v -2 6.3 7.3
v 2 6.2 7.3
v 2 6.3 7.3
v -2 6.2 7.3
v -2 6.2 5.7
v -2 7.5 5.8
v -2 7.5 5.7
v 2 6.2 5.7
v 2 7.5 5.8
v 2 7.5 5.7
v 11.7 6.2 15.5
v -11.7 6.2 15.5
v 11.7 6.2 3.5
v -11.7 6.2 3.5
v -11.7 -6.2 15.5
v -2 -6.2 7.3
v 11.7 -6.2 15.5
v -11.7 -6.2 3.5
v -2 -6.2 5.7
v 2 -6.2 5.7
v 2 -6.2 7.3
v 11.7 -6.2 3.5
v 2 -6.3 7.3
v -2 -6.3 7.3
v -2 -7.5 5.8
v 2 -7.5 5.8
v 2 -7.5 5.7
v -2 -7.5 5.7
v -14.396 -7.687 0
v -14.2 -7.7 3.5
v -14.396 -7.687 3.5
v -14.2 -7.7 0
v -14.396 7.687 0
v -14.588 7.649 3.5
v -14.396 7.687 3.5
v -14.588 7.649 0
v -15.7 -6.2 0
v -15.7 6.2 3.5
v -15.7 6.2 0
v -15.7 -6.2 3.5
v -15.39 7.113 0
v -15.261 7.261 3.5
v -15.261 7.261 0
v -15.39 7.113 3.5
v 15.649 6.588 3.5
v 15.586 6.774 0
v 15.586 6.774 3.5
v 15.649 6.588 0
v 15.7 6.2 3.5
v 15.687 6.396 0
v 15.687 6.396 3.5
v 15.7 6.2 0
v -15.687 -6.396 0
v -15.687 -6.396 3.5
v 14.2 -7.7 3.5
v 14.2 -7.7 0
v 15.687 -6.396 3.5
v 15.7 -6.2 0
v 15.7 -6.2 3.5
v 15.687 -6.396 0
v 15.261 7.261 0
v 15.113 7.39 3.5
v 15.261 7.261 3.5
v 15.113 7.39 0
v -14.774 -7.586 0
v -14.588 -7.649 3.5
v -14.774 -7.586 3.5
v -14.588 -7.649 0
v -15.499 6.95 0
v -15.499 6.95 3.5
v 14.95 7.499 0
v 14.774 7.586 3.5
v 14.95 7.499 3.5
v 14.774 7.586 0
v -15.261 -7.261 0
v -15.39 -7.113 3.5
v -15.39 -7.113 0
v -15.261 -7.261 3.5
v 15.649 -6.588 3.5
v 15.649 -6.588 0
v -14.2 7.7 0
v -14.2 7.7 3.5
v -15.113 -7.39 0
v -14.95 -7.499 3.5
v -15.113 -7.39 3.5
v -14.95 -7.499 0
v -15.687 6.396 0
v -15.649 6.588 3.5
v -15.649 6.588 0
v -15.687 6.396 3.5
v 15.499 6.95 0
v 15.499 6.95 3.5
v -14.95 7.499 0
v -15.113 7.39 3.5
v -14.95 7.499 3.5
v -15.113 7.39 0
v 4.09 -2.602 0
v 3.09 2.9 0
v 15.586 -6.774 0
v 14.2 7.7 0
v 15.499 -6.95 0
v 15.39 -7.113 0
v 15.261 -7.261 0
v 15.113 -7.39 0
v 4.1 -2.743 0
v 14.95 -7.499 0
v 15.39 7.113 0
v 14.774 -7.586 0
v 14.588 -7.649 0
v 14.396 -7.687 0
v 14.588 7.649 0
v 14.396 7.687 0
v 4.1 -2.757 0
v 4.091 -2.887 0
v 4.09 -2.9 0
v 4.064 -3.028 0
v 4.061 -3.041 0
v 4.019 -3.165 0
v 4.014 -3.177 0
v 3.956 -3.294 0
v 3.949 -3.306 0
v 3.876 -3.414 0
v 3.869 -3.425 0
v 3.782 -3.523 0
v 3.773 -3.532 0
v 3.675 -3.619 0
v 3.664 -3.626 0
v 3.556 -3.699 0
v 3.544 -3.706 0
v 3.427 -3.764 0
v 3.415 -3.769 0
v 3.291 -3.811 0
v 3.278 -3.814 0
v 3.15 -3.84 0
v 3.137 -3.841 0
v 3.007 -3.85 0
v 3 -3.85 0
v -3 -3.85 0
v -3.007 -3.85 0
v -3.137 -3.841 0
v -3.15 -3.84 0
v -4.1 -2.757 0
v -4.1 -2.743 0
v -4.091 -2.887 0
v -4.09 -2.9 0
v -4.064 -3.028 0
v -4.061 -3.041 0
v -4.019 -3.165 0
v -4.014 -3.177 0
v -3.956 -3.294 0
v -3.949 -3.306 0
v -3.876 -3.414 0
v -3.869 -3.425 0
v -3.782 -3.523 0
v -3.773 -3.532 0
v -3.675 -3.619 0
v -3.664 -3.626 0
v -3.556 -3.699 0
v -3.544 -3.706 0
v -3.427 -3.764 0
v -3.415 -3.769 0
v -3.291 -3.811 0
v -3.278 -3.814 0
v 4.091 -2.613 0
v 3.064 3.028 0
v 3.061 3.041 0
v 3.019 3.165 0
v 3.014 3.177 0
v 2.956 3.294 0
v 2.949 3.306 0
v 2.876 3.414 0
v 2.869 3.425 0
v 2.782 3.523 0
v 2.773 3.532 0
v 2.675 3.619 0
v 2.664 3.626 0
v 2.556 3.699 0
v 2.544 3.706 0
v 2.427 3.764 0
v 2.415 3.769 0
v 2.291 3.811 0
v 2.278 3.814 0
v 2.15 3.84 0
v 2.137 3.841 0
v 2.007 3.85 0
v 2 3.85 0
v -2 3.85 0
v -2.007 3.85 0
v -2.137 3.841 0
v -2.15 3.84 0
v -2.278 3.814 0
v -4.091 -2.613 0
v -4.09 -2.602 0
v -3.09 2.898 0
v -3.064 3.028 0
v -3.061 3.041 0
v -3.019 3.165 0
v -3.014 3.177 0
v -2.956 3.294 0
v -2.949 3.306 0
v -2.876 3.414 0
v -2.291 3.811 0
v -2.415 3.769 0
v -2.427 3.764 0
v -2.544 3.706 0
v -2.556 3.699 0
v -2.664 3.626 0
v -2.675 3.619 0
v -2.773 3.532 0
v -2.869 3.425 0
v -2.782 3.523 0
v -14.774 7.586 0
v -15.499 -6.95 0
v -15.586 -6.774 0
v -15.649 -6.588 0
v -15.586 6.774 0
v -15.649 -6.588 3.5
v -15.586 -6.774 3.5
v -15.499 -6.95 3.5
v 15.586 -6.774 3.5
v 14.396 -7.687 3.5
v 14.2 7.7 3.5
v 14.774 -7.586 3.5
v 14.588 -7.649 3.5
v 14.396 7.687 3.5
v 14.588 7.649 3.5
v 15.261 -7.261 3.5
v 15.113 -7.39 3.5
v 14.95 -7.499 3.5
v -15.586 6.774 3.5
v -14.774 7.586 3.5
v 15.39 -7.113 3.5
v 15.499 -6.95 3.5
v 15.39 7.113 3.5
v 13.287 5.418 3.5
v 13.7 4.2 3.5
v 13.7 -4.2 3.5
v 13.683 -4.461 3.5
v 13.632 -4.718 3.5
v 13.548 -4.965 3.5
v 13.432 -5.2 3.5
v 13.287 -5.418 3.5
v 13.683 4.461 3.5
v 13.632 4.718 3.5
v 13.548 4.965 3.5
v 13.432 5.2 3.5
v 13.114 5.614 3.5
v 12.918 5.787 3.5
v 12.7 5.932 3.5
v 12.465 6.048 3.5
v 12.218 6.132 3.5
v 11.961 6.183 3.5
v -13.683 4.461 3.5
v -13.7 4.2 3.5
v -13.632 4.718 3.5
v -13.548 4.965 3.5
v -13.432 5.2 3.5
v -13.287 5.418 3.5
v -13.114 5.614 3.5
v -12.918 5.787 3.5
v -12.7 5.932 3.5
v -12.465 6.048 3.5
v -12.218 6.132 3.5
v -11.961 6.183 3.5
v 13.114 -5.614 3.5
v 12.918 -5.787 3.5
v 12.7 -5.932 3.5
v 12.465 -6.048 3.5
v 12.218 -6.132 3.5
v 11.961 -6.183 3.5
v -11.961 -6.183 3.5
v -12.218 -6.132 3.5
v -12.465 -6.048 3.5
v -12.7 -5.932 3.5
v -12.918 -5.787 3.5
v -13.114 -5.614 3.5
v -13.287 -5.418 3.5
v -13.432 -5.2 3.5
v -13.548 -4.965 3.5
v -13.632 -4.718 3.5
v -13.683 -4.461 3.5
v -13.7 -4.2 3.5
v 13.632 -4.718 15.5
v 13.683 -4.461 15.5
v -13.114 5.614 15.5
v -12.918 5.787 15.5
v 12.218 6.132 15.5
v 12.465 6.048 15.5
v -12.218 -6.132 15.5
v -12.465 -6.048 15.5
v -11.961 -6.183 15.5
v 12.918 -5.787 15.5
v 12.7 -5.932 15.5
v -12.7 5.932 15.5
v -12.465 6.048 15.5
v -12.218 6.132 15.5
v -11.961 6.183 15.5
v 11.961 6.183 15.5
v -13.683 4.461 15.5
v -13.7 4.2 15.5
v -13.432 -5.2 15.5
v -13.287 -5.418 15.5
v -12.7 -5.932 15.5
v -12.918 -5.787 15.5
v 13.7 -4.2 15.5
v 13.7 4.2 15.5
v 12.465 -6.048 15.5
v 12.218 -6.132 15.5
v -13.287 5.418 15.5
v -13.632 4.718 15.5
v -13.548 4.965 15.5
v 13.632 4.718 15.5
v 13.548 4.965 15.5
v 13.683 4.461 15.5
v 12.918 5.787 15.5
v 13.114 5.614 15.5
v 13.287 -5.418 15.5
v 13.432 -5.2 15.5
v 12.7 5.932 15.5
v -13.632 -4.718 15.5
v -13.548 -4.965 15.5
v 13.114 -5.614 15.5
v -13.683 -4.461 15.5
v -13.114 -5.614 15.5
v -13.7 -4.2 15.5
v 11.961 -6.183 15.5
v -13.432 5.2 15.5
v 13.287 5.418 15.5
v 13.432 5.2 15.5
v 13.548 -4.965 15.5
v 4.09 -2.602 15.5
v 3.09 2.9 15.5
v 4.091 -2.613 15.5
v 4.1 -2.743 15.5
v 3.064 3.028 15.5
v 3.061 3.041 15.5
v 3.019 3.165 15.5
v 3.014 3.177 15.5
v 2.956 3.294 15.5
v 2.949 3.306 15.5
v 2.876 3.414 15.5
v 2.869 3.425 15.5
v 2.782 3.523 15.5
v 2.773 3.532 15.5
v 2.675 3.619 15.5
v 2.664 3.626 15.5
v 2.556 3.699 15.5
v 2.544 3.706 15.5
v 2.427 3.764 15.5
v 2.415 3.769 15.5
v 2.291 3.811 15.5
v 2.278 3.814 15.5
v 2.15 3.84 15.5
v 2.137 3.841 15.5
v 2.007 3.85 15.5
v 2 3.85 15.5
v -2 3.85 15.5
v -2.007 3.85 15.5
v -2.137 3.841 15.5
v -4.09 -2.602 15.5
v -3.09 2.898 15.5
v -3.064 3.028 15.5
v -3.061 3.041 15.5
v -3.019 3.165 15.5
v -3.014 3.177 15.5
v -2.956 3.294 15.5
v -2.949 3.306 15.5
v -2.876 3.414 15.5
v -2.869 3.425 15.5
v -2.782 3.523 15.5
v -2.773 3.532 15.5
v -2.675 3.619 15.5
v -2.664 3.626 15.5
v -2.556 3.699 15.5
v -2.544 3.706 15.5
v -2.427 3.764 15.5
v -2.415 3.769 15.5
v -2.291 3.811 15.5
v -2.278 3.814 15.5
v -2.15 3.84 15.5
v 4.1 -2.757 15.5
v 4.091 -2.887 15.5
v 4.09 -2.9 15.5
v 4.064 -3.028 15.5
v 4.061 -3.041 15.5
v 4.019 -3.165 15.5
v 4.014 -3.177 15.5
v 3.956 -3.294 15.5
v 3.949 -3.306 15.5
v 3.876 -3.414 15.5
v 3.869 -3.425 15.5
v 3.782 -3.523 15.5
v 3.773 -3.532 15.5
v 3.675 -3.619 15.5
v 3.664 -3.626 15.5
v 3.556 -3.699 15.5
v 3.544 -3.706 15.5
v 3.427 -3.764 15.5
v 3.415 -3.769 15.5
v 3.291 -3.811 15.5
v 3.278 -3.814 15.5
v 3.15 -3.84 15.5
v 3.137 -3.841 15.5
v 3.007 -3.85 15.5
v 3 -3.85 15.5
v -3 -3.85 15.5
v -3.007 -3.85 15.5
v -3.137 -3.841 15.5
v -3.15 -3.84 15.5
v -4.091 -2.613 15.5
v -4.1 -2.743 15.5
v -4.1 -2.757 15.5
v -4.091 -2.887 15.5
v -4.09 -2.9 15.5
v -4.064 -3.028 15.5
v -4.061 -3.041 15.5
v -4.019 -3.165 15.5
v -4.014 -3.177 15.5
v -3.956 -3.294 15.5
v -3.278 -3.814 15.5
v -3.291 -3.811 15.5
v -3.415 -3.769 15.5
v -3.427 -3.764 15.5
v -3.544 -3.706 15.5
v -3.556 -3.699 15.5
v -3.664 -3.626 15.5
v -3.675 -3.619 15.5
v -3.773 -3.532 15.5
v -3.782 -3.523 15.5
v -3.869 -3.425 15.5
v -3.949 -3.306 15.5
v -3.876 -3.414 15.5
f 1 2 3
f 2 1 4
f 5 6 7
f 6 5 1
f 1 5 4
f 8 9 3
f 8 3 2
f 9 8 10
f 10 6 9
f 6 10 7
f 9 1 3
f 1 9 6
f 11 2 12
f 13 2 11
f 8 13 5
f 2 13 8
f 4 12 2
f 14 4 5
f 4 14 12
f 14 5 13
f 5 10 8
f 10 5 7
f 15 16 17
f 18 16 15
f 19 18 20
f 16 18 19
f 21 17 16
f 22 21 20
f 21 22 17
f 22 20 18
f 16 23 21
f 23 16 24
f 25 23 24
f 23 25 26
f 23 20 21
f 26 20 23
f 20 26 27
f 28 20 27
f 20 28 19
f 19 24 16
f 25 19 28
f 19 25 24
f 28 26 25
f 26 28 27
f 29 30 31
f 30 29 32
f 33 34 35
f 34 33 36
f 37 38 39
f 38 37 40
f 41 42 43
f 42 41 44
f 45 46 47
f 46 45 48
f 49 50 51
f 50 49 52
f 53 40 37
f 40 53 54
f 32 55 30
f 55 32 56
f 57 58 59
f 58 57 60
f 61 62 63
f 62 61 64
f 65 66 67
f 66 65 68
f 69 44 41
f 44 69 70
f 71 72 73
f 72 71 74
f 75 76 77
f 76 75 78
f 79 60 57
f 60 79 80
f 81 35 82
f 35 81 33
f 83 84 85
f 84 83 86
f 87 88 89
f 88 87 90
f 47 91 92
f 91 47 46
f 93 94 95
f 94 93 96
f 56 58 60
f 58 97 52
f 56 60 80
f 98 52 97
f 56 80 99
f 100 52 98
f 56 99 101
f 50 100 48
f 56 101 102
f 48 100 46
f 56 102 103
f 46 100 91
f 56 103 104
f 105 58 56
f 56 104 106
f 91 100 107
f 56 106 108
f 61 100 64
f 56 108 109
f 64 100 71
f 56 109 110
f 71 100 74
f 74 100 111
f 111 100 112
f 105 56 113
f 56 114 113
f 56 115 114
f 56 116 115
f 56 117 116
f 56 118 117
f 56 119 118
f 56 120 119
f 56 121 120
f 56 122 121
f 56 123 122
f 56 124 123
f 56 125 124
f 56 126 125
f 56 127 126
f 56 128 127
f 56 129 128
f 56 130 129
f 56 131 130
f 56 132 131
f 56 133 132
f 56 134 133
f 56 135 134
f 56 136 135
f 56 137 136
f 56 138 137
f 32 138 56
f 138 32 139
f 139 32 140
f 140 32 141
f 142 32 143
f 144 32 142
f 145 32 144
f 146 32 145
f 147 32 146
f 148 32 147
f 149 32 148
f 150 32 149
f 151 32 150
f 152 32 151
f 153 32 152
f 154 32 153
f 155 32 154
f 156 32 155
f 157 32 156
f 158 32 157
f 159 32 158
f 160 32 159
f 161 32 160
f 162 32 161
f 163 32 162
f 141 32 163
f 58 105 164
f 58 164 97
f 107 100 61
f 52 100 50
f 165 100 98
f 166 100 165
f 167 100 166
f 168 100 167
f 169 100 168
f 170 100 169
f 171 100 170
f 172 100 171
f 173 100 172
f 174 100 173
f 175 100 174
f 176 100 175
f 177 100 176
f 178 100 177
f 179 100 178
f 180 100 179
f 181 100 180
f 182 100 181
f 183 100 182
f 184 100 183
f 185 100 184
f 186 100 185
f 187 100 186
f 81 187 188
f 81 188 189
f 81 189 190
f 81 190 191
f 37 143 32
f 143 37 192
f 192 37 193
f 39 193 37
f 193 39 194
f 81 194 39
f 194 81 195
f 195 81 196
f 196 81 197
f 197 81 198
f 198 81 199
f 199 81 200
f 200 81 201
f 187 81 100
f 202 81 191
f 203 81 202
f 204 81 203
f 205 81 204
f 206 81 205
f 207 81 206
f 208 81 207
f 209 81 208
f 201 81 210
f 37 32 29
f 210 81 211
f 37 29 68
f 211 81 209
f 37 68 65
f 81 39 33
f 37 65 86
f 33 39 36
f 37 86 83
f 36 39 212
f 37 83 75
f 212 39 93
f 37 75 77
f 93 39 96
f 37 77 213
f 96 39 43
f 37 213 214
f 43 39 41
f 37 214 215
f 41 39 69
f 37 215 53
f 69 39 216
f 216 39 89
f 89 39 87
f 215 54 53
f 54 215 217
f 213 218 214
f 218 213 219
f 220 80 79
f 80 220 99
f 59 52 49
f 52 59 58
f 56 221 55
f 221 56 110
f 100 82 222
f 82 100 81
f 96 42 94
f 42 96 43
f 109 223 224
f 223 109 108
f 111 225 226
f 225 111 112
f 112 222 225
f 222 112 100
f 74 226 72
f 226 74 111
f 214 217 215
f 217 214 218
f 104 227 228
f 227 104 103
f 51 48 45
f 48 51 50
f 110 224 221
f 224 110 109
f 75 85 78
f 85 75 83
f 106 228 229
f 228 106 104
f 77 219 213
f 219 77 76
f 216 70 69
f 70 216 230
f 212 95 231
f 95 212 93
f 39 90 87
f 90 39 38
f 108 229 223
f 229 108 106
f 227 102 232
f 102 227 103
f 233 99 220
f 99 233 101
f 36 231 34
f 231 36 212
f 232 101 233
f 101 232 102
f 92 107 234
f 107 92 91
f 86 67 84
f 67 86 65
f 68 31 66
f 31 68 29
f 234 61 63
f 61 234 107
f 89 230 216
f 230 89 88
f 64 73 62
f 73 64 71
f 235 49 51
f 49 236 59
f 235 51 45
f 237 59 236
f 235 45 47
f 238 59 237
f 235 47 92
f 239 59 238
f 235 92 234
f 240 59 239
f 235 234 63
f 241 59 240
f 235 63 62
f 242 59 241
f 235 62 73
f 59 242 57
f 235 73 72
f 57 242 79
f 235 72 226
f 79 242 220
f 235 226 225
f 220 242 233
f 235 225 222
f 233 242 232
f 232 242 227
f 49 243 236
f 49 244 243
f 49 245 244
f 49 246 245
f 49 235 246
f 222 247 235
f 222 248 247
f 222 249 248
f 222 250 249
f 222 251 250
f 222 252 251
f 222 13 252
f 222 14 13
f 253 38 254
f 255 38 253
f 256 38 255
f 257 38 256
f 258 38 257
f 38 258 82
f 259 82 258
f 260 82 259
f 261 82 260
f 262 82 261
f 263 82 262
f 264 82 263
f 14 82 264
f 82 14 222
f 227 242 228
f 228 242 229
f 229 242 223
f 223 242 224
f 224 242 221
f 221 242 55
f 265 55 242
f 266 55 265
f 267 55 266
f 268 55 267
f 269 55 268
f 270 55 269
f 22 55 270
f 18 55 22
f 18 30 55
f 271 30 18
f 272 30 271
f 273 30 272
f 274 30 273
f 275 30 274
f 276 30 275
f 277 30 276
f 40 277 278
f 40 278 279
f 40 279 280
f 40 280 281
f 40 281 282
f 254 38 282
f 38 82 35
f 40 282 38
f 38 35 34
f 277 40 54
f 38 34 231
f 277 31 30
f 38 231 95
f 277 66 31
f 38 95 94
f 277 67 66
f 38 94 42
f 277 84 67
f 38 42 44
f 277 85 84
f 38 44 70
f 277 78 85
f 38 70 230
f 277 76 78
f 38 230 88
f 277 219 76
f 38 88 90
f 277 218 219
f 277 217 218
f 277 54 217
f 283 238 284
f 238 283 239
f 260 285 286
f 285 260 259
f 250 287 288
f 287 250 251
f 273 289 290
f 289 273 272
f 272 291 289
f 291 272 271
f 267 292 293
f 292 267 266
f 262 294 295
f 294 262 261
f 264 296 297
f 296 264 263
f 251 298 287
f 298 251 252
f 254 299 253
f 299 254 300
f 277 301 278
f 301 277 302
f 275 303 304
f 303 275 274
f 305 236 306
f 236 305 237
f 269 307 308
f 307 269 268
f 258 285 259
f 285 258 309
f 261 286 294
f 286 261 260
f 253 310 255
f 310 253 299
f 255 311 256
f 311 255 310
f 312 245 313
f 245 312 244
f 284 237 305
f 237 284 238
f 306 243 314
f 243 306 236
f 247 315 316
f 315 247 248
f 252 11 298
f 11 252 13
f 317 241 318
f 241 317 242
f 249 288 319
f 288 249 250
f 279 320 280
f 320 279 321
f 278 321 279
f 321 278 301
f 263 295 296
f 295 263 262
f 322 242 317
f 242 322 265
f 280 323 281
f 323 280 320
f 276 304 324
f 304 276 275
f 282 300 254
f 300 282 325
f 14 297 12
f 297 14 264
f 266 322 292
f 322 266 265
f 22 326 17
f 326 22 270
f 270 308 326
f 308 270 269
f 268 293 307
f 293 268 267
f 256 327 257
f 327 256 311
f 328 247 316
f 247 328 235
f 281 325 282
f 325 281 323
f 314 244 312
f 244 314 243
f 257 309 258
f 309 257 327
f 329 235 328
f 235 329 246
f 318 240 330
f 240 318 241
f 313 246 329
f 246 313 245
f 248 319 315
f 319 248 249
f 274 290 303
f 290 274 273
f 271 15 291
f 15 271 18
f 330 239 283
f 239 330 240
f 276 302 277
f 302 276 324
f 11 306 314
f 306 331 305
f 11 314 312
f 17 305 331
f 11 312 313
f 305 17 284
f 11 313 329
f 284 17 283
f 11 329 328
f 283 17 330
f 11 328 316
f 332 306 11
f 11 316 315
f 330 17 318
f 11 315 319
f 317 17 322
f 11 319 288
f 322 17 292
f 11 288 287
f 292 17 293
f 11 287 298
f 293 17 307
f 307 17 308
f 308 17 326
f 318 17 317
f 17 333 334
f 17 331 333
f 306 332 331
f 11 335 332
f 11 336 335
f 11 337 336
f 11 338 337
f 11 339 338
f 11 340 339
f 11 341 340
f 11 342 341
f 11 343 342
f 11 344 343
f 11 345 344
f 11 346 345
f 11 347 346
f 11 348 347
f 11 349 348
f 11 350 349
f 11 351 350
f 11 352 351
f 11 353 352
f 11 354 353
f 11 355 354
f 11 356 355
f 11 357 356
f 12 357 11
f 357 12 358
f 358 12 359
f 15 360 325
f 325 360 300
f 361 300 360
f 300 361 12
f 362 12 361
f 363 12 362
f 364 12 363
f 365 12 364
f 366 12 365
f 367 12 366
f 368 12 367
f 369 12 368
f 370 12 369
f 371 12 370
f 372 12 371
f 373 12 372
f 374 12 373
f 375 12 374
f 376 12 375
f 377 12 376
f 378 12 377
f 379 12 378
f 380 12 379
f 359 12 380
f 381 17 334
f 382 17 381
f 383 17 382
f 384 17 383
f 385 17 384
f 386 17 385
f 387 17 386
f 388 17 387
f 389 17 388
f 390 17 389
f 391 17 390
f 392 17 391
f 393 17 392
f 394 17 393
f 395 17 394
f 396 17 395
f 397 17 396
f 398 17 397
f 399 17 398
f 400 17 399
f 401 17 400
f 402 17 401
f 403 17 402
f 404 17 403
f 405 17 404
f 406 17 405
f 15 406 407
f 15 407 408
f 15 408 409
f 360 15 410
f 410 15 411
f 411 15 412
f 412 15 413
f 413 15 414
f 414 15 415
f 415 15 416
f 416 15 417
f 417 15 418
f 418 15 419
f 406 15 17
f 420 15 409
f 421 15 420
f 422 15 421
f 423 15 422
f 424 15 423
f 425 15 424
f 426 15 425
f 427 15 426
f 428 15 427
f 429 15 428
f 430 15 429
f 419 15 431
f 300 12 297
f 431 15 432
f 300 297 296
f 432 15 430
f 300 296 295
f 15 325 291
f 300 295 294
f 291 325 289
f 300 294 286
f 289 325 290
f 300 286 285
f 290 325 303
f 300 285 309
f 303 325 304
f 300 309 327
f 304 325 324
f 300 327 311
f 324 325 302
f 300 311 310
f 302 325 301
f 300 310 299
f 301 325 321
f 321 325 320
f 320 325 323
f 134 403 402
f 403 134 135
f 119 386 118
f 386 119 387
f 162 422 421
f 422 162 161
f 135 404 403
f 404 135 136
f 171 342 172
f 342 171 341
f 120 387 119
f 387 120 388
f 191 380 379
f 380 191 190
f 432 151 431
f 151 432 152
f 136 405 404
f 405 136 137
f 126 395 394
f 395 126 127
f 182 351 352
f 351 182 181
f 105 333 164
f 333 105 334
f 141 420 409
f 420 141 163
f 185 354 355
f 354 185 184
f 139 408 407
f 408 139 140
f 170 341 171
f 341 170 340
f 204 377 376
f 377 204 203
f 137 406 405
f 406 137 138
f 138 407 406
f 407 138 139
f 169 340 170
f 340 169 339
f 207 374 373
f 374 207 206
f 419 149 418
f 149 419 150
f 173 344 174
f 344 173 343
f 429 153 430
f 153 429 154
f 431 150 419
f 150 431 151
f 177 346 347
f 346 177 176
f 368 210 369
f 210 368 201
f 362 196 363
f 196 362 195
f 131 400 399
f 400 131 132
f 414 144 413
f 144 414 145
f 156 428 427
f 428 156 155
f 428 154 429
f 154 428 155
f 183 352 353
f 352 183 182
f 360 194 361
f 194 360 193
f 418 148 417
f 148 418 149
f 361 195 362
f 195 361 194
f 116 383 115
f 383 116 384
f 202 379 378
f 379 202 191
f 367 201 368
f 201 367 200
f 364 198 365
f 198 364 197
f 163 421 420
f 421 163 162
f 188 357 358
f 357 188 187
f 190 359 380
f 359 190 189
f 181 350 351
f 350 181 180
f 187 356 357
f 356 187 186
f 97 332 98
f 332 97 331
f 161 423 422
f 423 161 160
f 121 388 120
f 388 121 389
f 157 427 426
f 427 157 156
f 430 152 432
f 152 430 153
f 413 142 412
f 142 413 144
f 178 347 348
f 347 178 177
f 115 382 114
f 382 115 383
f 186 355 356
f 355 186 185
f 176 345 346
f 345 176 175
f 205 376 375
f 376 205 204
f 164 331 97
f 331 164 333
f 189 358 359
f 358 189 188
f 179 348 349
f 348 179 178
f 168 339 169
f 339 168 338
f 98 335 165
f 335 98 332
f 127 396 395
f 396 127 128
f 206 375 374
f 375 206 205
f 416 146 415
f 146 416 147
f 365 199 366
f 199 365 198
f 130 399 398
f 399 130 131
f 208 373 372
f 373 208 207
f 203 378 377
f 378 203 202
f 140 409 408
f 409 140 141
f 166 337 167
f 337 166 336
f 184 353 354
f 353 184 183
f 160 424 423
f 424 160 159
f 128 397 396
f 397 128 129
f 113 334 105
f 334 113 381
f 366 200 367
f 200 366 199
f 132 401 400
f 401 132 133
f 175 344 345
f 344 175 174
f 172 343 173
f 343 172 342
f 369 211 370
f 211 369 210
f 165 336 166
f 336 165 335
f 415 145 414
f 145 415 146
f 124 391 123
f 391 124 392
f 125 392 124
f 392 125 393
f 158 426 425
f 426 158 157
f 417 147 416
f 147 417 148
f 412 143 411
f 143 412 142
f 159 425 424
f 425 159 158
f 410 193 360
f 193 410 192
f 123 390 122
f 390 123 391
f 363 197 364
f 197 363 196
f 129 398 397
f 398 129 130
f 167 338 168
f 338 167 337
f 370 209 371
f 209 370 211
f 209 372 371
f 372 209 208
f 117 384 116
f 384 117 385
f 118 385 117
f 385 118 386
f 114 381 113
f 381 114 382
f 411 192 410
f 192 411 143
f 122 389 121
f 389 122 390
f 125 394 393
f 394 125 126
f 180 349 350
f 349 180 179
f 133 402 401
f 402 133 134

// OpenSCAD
// file: parameters.scad
// ============================================
// MODULAR CABLE ORGANIZER - SHARED PARAMETERS
// ============================================
// All dimensions in mm - include this in all files
// ============================================

$fn = 48;

// === TOLERANCES ===
clearance = 0.3;
port_clearance = 0.1;  // Extra clearance for port openings (reduced - 0.2 was too loose for USB-C)
wall = 1.6;

// === SLOT DIMENSIONS (2:1 aspect ratio) - scaled to 2/3 ===
slot_width = 32;  // Reduced by 1mm for more compact insert
slot_height = 16;  // Reduced by 1mm for more compact insert
slot_depth = 4;  // Reduced from 6mm - less frame depth needed

// === FRAME STRUCTURE ===
frame_wall = 0.5;   // Reduced for more compact frame
frame_border = 8;  // Increased by 10mm for mounting holes with countersink
frame_back = 2;     // Slightly thicker for snap catch strength
mount_hole_dia = 3;
countersink_dia = 6;  // Diameter of countersink for screw heads
countersink_depth = 2;  // Depth of countersink

// === GRID ===
grid_cols = 2;
grid_rows = 2;

// === INSERT BASE DIMENSIONS ===
insert_width = slot_width - (2 * clearance);
insert_height = slot_height - (2 * clearance);
insert_base_depth = slot_depth - 0.5;

// === INSERT BODY (protrudes from frame) ===
insert_body_width = insert_width - 4;
insert_body_height = insert_height - 3;
insert_body_depth = 12;  // Deep enough to accommodate male cable connectors
insert_top_thick = 1.5;  // Top platform thickness

// === SNAP TABS (on neck/body - catch on back plate) ===
snap_tab_width = 4;
snap_tab_protrude = 1.2;  // How far tab sticks out from body
snap_tab_thick = 1.5;     // Z thickness of tab
snap_tab_offset = 2.2;      // Distance from base to tab bottom on insert (increased to clear frame)

// === CONNECTOR PORT DIMENSIONS & BODY DEPTHS ===
// Port dimensions from reference blueprints
// Body depths sized to match typical male connector lengths

// USB-C: 8.4 x 2.6mm, male connector ~9mm
usbc_w = 8.4;
usbc_h = 2.6;
usbc_r = 1.0;
usbc_body_depth = 9;

// USB-A: 14.0 x 6.5mm, male connector ~13mm
usba_w = 14.0;
usba_h = 6.5;
usba_r = 0.5;
usba_body_depth = 13;

// USB Mini: 6.9 x 3.0mm, male connector ~9mm
usb_mini_w = 6.9;
usb_mini_h = 3.0;
usb_mini_r = 0.5;
usb_mini_body_depth = 9;

// USB Micro: 6.9 x 1.8mm, male connector ~7mm
usb_micro_w = 6.9;
usb_micro_h = 1.8;
usb_micro_r = 0.3;
usb_micro_body_depth = 7;

// USB-B: 8.0 x 7.5mm, male connector ~14mm
usb_b_w = 8.0;
usb_b_h = 7.5;
usb_b_r = 1.0;
usb_b_body_depth = 14;

// Lightning: 6.7 x 1.5mm, male connector ~8mm
lightning_w = 6.7;
lightning_h = 1.5;
lightning_r = 0.5;
lightning_body_depth = 8;

// HDMI: 14.0 x 4.5mm, male connector ~16mm
hdmi_w = 14.0;
hdmi_h = 4.5;
hdmi_r = 0.5;
hdmi_body_depth = 16;

// 3.5mm Audio Jack: male plug ~14mm
audio_jack_dia = 6.0;
audio_jack_body_depth = 14;

// Blank/Label: recessed area for label
label_w = 30;
label_h = 12;
label_depth = 0.8;

// === CALCULATED VALUES ===
frame_total_depth = frame_back + slot_depth;
grid_width = (grid_cols * slot_width) + ((grid_cols - 1) * frame_wall);
grid_height = (grid_rows * slot_height) + ((grid_rows - 1) * frame_wall);
frame_width = grid_width + (2 * frame_border);
frame_height_total = grid_height + (2 * frame_border);
insert_total_depth = insert_base_depth + insert_body_depth;
// file: insert_base.scad
// ============================================
// MODULAR CABLE ORGANIZER - BASE INSERT MODULE
// ============================================
// This is the parent module for all insert types
// Include this file and call insert_with_port() with a port shape
// ============================================

include <parameters.scad>

// === BASE INSERT WITH CUSTOM BODY DEPTH ===
module insert_blank_custom(body_depth) {
    union() {
        // Base plate (sits in frame slot)
        rounded_box_rect(insert_width, insert_height, insert_base_depth, 1.5);
        
        // Body (protrudes out front) - custom depth
        translate([0, 0, insert_base_depth])
            rounded_box_rect(insert_body_width, insert_body_height, body_depth, 2);
        
        // Snap tabs on all 4 sides
        snap_tabs_all();
    }
}

// === BASE INSERT (default depth - for backwards compatibility) ===
module insert_blank() {
    insert_blank_custom(insert_body_depth);
}

// === INSERT WITH THROUGH-HOLE PORT (custom depth) ===
// Pass body_depth and a 2D shape as children
module insert_with_port_custom(body_depth) {
    total_depth = insert_base_depth + body_depth;
    difference() {
        insert_blank_custom(body_depth);
        
        // Cut port hole ALL THE WAY through (tube shape)
        translate([0, 0, -0.1])
            linear_extrude(total_depth + 0.2)
            offset(r=port_clearance)  // Add clearance to port opening
            children();
    }
}

// === INSERT WITH THROUGH-HOLE PORT (default depth) ===
module insert_with_port() {
    insert_with_port_custom(insert_body_depth) children();
}

// === PRE-MADE INSERT MODULES WITH CORRECT DEPTHS ===
module insert_usbc() {
    insert_with_port_custom(usbc_body_depth) port_usbc();
}

module insert_usba() {
    insert_with_port_custom(usba_body_depth) port_usba();
}

module insert_usb_mini() {
    insert_with_port_custom(usb_mini_body_depth) port_usb_mini();
}

module insert_usb_micro() {
    insert_with_port_custom(usb_micro_body_depth) port_usb_micro();
}

module insert_usb_b() {
    insert_with_port_custom(usb_b_body_depth) port_usb_b();
}

module insert_lightning() {
    insert_with_port_custom(lightning_body_depth) port_lightning();
}

module insert_hdmi() {
    insert_with_port_custom(hdmi_body_depth) port_hdmi();
}

module insert_audio_jack() {
    insert_with_port_custom(audio_jack_body_depth) port_audio_jack();
}

// === SNAP TABS (on neck/body - catch on frame cutouts) ===
// Tabs are on the body, positioned to engage with frame wall cutouts
module snap_tabs_all() {
    // Position tabs up on body (clear of base/frame)
    tab_z = insert_base_depth + snap_tab_offset;
    
    // Tabs on all 4 sides of the body
    for (angle = [0, 90, 180, 270]) {
        rotate([0, 0, angle])
            translate([0, insert_body_height/2, tab_z])
            neck_snap_tab();
    }
}

module neck_snap_tab() {
    // Wedge shape (FLIPPED): 
    // - Peak/taper on BOTTOM - slides past back plate when inserting
    // - Flat on TOP - catches and holds
    hull() {
        // Peak of wedge (protruding, at BOTTOM of tab)
        translate([-snap_tab_width/2, snap_tab_protrude, 0])
            cube([snap_tab_width, 0.1, 0.1]);
        // Flat top (at body surface, TOP of tab)
        translate([-snap_tab_width/2, 0, snap_tab_thick])
            cube([snap_tab_width, 0.1, 0.1]);
        // Base of wedge (at body surface, bottom)
        translate([-snap_tab_width/2, 0, 0])
            cube([snap_tab_width, 0.1, 0.1]);
    }
}

module snap_tab_horizontal() {
    hull() {
        translate([0, -snap_tab_protrude/2, 0])
            cube([snap_tab_width, 0.1, snap_tab_thick], center=true);
        translate([0, snap_tab_protrude/2, snap_tab_thick * 0.2])
            cube([snap_tab_width, 0.1, snap_tab_thick * 0.6], center=true);
    }
}

module snap_tab_vertical() {
    hull() {
        translate([-snap_tab_protrude/2, 0, 0])
            cube([0.1, snap_tab_width, snap_tab_thick], center=true);
        translate([snap_tab_protrude/2, 0, snap_tab_thick * 0.2])
            cube([0.1, snap_tab_width, snap_tab_thick * 0.6], center=true);
    }
}

// === UTILITY MODULES ===
module rounded_box_rect(w, d, h, r) {
    translate([0, 0, h/2])
        hull() {
            for (x = [-1, 1], y = [-1, 1])
                translate([x * (w/2 - r), y * (d/2 - r), 0])
                    cylinder(h=h, r=r, center=true);
        }
}

// === PORT SHAPE MODULES (2D) ===
// These define the cutout shapes for each connector type

module port_rounded_rect(w, h, r) {
    // Standard rounded rectangle
    hull() {
        for (x = [-1, 1], y = [-1, 1])
            translate([x * (w/2 - r), y * (h/2 - r)])
                circle(r=r);
    }
}

module port_usbc() {
    port_rounded_rect(usbc_w, usbc_h, usbc_r);
}

module port_usba() {
    port_rounded_rect(usba_w, usba_h, usba_r);
}

module port_usb_mini() {
    port_rounded_rect(usb_mini_w, usb_mini_h, usb_mini_r);
}

module port_usb_micro() {
    port_rounded_rect(usb_micro_w, usb_micro_h, usb_micro_r);
}

module port_usb_b() {
    // USB-B has beveled top corners
    hull() {
        // Bottom corners (full radius)
        for (x = [-1, 1])
            translate([x * (usb_b_w/2 - usb_b_r), -(usb_b_h/2 - usb_b_r)])
                circle(r=usb_b_r);
        // Top corners (chamfered - moved inward)
        for (x = [-1, 1])
            translate([x * (usb_b_w/2 - usb_b_r - 1), (usb_b_h/2 - usb_b_r)])
                circle(r=usb_b_r);
    }
}

module port_lightning() {
    port_rounded_rect(lightning_w, lightning_h, lightning_r);
}

module port_hdmi() {
    // HDMI is tapered (wider at top)
    hull() {
        // Top (wider)
        for (x = [-1, 1])
            translate([x * (hdmi_w/2 - hdmi_r), (hdmi_h/2 - hdmi_r)])
                circle(r=hdmi_r);
        // Bottom (narrower)
        for (x = [-1, 1])
            translate([x * (hdmi_w/2 - hdmi_r - 1), -(hdmi_h/2 - hdmi_r)])
                circle(r=hdmi_r);
    }
}

module port_audio_jack() {
    circle(d=audio_jack_dia);
}

module port_label_recess() {
    // Shallow rectangular recess for labels
    square([label_w, label_h], center=true);
}

// === RENDER (for testing this file directly) ===
// insert_blank();
// main file
// ============================================
// USB-B FEMALE INSERT
// Port: 8.0mm x 7.5mm with beveled top corners
// ============================================

include <insert_base.scad>

module insert_usb_b() {
    insert_with_port() port_usb_b();
}

// Render
insert_usb_b();
